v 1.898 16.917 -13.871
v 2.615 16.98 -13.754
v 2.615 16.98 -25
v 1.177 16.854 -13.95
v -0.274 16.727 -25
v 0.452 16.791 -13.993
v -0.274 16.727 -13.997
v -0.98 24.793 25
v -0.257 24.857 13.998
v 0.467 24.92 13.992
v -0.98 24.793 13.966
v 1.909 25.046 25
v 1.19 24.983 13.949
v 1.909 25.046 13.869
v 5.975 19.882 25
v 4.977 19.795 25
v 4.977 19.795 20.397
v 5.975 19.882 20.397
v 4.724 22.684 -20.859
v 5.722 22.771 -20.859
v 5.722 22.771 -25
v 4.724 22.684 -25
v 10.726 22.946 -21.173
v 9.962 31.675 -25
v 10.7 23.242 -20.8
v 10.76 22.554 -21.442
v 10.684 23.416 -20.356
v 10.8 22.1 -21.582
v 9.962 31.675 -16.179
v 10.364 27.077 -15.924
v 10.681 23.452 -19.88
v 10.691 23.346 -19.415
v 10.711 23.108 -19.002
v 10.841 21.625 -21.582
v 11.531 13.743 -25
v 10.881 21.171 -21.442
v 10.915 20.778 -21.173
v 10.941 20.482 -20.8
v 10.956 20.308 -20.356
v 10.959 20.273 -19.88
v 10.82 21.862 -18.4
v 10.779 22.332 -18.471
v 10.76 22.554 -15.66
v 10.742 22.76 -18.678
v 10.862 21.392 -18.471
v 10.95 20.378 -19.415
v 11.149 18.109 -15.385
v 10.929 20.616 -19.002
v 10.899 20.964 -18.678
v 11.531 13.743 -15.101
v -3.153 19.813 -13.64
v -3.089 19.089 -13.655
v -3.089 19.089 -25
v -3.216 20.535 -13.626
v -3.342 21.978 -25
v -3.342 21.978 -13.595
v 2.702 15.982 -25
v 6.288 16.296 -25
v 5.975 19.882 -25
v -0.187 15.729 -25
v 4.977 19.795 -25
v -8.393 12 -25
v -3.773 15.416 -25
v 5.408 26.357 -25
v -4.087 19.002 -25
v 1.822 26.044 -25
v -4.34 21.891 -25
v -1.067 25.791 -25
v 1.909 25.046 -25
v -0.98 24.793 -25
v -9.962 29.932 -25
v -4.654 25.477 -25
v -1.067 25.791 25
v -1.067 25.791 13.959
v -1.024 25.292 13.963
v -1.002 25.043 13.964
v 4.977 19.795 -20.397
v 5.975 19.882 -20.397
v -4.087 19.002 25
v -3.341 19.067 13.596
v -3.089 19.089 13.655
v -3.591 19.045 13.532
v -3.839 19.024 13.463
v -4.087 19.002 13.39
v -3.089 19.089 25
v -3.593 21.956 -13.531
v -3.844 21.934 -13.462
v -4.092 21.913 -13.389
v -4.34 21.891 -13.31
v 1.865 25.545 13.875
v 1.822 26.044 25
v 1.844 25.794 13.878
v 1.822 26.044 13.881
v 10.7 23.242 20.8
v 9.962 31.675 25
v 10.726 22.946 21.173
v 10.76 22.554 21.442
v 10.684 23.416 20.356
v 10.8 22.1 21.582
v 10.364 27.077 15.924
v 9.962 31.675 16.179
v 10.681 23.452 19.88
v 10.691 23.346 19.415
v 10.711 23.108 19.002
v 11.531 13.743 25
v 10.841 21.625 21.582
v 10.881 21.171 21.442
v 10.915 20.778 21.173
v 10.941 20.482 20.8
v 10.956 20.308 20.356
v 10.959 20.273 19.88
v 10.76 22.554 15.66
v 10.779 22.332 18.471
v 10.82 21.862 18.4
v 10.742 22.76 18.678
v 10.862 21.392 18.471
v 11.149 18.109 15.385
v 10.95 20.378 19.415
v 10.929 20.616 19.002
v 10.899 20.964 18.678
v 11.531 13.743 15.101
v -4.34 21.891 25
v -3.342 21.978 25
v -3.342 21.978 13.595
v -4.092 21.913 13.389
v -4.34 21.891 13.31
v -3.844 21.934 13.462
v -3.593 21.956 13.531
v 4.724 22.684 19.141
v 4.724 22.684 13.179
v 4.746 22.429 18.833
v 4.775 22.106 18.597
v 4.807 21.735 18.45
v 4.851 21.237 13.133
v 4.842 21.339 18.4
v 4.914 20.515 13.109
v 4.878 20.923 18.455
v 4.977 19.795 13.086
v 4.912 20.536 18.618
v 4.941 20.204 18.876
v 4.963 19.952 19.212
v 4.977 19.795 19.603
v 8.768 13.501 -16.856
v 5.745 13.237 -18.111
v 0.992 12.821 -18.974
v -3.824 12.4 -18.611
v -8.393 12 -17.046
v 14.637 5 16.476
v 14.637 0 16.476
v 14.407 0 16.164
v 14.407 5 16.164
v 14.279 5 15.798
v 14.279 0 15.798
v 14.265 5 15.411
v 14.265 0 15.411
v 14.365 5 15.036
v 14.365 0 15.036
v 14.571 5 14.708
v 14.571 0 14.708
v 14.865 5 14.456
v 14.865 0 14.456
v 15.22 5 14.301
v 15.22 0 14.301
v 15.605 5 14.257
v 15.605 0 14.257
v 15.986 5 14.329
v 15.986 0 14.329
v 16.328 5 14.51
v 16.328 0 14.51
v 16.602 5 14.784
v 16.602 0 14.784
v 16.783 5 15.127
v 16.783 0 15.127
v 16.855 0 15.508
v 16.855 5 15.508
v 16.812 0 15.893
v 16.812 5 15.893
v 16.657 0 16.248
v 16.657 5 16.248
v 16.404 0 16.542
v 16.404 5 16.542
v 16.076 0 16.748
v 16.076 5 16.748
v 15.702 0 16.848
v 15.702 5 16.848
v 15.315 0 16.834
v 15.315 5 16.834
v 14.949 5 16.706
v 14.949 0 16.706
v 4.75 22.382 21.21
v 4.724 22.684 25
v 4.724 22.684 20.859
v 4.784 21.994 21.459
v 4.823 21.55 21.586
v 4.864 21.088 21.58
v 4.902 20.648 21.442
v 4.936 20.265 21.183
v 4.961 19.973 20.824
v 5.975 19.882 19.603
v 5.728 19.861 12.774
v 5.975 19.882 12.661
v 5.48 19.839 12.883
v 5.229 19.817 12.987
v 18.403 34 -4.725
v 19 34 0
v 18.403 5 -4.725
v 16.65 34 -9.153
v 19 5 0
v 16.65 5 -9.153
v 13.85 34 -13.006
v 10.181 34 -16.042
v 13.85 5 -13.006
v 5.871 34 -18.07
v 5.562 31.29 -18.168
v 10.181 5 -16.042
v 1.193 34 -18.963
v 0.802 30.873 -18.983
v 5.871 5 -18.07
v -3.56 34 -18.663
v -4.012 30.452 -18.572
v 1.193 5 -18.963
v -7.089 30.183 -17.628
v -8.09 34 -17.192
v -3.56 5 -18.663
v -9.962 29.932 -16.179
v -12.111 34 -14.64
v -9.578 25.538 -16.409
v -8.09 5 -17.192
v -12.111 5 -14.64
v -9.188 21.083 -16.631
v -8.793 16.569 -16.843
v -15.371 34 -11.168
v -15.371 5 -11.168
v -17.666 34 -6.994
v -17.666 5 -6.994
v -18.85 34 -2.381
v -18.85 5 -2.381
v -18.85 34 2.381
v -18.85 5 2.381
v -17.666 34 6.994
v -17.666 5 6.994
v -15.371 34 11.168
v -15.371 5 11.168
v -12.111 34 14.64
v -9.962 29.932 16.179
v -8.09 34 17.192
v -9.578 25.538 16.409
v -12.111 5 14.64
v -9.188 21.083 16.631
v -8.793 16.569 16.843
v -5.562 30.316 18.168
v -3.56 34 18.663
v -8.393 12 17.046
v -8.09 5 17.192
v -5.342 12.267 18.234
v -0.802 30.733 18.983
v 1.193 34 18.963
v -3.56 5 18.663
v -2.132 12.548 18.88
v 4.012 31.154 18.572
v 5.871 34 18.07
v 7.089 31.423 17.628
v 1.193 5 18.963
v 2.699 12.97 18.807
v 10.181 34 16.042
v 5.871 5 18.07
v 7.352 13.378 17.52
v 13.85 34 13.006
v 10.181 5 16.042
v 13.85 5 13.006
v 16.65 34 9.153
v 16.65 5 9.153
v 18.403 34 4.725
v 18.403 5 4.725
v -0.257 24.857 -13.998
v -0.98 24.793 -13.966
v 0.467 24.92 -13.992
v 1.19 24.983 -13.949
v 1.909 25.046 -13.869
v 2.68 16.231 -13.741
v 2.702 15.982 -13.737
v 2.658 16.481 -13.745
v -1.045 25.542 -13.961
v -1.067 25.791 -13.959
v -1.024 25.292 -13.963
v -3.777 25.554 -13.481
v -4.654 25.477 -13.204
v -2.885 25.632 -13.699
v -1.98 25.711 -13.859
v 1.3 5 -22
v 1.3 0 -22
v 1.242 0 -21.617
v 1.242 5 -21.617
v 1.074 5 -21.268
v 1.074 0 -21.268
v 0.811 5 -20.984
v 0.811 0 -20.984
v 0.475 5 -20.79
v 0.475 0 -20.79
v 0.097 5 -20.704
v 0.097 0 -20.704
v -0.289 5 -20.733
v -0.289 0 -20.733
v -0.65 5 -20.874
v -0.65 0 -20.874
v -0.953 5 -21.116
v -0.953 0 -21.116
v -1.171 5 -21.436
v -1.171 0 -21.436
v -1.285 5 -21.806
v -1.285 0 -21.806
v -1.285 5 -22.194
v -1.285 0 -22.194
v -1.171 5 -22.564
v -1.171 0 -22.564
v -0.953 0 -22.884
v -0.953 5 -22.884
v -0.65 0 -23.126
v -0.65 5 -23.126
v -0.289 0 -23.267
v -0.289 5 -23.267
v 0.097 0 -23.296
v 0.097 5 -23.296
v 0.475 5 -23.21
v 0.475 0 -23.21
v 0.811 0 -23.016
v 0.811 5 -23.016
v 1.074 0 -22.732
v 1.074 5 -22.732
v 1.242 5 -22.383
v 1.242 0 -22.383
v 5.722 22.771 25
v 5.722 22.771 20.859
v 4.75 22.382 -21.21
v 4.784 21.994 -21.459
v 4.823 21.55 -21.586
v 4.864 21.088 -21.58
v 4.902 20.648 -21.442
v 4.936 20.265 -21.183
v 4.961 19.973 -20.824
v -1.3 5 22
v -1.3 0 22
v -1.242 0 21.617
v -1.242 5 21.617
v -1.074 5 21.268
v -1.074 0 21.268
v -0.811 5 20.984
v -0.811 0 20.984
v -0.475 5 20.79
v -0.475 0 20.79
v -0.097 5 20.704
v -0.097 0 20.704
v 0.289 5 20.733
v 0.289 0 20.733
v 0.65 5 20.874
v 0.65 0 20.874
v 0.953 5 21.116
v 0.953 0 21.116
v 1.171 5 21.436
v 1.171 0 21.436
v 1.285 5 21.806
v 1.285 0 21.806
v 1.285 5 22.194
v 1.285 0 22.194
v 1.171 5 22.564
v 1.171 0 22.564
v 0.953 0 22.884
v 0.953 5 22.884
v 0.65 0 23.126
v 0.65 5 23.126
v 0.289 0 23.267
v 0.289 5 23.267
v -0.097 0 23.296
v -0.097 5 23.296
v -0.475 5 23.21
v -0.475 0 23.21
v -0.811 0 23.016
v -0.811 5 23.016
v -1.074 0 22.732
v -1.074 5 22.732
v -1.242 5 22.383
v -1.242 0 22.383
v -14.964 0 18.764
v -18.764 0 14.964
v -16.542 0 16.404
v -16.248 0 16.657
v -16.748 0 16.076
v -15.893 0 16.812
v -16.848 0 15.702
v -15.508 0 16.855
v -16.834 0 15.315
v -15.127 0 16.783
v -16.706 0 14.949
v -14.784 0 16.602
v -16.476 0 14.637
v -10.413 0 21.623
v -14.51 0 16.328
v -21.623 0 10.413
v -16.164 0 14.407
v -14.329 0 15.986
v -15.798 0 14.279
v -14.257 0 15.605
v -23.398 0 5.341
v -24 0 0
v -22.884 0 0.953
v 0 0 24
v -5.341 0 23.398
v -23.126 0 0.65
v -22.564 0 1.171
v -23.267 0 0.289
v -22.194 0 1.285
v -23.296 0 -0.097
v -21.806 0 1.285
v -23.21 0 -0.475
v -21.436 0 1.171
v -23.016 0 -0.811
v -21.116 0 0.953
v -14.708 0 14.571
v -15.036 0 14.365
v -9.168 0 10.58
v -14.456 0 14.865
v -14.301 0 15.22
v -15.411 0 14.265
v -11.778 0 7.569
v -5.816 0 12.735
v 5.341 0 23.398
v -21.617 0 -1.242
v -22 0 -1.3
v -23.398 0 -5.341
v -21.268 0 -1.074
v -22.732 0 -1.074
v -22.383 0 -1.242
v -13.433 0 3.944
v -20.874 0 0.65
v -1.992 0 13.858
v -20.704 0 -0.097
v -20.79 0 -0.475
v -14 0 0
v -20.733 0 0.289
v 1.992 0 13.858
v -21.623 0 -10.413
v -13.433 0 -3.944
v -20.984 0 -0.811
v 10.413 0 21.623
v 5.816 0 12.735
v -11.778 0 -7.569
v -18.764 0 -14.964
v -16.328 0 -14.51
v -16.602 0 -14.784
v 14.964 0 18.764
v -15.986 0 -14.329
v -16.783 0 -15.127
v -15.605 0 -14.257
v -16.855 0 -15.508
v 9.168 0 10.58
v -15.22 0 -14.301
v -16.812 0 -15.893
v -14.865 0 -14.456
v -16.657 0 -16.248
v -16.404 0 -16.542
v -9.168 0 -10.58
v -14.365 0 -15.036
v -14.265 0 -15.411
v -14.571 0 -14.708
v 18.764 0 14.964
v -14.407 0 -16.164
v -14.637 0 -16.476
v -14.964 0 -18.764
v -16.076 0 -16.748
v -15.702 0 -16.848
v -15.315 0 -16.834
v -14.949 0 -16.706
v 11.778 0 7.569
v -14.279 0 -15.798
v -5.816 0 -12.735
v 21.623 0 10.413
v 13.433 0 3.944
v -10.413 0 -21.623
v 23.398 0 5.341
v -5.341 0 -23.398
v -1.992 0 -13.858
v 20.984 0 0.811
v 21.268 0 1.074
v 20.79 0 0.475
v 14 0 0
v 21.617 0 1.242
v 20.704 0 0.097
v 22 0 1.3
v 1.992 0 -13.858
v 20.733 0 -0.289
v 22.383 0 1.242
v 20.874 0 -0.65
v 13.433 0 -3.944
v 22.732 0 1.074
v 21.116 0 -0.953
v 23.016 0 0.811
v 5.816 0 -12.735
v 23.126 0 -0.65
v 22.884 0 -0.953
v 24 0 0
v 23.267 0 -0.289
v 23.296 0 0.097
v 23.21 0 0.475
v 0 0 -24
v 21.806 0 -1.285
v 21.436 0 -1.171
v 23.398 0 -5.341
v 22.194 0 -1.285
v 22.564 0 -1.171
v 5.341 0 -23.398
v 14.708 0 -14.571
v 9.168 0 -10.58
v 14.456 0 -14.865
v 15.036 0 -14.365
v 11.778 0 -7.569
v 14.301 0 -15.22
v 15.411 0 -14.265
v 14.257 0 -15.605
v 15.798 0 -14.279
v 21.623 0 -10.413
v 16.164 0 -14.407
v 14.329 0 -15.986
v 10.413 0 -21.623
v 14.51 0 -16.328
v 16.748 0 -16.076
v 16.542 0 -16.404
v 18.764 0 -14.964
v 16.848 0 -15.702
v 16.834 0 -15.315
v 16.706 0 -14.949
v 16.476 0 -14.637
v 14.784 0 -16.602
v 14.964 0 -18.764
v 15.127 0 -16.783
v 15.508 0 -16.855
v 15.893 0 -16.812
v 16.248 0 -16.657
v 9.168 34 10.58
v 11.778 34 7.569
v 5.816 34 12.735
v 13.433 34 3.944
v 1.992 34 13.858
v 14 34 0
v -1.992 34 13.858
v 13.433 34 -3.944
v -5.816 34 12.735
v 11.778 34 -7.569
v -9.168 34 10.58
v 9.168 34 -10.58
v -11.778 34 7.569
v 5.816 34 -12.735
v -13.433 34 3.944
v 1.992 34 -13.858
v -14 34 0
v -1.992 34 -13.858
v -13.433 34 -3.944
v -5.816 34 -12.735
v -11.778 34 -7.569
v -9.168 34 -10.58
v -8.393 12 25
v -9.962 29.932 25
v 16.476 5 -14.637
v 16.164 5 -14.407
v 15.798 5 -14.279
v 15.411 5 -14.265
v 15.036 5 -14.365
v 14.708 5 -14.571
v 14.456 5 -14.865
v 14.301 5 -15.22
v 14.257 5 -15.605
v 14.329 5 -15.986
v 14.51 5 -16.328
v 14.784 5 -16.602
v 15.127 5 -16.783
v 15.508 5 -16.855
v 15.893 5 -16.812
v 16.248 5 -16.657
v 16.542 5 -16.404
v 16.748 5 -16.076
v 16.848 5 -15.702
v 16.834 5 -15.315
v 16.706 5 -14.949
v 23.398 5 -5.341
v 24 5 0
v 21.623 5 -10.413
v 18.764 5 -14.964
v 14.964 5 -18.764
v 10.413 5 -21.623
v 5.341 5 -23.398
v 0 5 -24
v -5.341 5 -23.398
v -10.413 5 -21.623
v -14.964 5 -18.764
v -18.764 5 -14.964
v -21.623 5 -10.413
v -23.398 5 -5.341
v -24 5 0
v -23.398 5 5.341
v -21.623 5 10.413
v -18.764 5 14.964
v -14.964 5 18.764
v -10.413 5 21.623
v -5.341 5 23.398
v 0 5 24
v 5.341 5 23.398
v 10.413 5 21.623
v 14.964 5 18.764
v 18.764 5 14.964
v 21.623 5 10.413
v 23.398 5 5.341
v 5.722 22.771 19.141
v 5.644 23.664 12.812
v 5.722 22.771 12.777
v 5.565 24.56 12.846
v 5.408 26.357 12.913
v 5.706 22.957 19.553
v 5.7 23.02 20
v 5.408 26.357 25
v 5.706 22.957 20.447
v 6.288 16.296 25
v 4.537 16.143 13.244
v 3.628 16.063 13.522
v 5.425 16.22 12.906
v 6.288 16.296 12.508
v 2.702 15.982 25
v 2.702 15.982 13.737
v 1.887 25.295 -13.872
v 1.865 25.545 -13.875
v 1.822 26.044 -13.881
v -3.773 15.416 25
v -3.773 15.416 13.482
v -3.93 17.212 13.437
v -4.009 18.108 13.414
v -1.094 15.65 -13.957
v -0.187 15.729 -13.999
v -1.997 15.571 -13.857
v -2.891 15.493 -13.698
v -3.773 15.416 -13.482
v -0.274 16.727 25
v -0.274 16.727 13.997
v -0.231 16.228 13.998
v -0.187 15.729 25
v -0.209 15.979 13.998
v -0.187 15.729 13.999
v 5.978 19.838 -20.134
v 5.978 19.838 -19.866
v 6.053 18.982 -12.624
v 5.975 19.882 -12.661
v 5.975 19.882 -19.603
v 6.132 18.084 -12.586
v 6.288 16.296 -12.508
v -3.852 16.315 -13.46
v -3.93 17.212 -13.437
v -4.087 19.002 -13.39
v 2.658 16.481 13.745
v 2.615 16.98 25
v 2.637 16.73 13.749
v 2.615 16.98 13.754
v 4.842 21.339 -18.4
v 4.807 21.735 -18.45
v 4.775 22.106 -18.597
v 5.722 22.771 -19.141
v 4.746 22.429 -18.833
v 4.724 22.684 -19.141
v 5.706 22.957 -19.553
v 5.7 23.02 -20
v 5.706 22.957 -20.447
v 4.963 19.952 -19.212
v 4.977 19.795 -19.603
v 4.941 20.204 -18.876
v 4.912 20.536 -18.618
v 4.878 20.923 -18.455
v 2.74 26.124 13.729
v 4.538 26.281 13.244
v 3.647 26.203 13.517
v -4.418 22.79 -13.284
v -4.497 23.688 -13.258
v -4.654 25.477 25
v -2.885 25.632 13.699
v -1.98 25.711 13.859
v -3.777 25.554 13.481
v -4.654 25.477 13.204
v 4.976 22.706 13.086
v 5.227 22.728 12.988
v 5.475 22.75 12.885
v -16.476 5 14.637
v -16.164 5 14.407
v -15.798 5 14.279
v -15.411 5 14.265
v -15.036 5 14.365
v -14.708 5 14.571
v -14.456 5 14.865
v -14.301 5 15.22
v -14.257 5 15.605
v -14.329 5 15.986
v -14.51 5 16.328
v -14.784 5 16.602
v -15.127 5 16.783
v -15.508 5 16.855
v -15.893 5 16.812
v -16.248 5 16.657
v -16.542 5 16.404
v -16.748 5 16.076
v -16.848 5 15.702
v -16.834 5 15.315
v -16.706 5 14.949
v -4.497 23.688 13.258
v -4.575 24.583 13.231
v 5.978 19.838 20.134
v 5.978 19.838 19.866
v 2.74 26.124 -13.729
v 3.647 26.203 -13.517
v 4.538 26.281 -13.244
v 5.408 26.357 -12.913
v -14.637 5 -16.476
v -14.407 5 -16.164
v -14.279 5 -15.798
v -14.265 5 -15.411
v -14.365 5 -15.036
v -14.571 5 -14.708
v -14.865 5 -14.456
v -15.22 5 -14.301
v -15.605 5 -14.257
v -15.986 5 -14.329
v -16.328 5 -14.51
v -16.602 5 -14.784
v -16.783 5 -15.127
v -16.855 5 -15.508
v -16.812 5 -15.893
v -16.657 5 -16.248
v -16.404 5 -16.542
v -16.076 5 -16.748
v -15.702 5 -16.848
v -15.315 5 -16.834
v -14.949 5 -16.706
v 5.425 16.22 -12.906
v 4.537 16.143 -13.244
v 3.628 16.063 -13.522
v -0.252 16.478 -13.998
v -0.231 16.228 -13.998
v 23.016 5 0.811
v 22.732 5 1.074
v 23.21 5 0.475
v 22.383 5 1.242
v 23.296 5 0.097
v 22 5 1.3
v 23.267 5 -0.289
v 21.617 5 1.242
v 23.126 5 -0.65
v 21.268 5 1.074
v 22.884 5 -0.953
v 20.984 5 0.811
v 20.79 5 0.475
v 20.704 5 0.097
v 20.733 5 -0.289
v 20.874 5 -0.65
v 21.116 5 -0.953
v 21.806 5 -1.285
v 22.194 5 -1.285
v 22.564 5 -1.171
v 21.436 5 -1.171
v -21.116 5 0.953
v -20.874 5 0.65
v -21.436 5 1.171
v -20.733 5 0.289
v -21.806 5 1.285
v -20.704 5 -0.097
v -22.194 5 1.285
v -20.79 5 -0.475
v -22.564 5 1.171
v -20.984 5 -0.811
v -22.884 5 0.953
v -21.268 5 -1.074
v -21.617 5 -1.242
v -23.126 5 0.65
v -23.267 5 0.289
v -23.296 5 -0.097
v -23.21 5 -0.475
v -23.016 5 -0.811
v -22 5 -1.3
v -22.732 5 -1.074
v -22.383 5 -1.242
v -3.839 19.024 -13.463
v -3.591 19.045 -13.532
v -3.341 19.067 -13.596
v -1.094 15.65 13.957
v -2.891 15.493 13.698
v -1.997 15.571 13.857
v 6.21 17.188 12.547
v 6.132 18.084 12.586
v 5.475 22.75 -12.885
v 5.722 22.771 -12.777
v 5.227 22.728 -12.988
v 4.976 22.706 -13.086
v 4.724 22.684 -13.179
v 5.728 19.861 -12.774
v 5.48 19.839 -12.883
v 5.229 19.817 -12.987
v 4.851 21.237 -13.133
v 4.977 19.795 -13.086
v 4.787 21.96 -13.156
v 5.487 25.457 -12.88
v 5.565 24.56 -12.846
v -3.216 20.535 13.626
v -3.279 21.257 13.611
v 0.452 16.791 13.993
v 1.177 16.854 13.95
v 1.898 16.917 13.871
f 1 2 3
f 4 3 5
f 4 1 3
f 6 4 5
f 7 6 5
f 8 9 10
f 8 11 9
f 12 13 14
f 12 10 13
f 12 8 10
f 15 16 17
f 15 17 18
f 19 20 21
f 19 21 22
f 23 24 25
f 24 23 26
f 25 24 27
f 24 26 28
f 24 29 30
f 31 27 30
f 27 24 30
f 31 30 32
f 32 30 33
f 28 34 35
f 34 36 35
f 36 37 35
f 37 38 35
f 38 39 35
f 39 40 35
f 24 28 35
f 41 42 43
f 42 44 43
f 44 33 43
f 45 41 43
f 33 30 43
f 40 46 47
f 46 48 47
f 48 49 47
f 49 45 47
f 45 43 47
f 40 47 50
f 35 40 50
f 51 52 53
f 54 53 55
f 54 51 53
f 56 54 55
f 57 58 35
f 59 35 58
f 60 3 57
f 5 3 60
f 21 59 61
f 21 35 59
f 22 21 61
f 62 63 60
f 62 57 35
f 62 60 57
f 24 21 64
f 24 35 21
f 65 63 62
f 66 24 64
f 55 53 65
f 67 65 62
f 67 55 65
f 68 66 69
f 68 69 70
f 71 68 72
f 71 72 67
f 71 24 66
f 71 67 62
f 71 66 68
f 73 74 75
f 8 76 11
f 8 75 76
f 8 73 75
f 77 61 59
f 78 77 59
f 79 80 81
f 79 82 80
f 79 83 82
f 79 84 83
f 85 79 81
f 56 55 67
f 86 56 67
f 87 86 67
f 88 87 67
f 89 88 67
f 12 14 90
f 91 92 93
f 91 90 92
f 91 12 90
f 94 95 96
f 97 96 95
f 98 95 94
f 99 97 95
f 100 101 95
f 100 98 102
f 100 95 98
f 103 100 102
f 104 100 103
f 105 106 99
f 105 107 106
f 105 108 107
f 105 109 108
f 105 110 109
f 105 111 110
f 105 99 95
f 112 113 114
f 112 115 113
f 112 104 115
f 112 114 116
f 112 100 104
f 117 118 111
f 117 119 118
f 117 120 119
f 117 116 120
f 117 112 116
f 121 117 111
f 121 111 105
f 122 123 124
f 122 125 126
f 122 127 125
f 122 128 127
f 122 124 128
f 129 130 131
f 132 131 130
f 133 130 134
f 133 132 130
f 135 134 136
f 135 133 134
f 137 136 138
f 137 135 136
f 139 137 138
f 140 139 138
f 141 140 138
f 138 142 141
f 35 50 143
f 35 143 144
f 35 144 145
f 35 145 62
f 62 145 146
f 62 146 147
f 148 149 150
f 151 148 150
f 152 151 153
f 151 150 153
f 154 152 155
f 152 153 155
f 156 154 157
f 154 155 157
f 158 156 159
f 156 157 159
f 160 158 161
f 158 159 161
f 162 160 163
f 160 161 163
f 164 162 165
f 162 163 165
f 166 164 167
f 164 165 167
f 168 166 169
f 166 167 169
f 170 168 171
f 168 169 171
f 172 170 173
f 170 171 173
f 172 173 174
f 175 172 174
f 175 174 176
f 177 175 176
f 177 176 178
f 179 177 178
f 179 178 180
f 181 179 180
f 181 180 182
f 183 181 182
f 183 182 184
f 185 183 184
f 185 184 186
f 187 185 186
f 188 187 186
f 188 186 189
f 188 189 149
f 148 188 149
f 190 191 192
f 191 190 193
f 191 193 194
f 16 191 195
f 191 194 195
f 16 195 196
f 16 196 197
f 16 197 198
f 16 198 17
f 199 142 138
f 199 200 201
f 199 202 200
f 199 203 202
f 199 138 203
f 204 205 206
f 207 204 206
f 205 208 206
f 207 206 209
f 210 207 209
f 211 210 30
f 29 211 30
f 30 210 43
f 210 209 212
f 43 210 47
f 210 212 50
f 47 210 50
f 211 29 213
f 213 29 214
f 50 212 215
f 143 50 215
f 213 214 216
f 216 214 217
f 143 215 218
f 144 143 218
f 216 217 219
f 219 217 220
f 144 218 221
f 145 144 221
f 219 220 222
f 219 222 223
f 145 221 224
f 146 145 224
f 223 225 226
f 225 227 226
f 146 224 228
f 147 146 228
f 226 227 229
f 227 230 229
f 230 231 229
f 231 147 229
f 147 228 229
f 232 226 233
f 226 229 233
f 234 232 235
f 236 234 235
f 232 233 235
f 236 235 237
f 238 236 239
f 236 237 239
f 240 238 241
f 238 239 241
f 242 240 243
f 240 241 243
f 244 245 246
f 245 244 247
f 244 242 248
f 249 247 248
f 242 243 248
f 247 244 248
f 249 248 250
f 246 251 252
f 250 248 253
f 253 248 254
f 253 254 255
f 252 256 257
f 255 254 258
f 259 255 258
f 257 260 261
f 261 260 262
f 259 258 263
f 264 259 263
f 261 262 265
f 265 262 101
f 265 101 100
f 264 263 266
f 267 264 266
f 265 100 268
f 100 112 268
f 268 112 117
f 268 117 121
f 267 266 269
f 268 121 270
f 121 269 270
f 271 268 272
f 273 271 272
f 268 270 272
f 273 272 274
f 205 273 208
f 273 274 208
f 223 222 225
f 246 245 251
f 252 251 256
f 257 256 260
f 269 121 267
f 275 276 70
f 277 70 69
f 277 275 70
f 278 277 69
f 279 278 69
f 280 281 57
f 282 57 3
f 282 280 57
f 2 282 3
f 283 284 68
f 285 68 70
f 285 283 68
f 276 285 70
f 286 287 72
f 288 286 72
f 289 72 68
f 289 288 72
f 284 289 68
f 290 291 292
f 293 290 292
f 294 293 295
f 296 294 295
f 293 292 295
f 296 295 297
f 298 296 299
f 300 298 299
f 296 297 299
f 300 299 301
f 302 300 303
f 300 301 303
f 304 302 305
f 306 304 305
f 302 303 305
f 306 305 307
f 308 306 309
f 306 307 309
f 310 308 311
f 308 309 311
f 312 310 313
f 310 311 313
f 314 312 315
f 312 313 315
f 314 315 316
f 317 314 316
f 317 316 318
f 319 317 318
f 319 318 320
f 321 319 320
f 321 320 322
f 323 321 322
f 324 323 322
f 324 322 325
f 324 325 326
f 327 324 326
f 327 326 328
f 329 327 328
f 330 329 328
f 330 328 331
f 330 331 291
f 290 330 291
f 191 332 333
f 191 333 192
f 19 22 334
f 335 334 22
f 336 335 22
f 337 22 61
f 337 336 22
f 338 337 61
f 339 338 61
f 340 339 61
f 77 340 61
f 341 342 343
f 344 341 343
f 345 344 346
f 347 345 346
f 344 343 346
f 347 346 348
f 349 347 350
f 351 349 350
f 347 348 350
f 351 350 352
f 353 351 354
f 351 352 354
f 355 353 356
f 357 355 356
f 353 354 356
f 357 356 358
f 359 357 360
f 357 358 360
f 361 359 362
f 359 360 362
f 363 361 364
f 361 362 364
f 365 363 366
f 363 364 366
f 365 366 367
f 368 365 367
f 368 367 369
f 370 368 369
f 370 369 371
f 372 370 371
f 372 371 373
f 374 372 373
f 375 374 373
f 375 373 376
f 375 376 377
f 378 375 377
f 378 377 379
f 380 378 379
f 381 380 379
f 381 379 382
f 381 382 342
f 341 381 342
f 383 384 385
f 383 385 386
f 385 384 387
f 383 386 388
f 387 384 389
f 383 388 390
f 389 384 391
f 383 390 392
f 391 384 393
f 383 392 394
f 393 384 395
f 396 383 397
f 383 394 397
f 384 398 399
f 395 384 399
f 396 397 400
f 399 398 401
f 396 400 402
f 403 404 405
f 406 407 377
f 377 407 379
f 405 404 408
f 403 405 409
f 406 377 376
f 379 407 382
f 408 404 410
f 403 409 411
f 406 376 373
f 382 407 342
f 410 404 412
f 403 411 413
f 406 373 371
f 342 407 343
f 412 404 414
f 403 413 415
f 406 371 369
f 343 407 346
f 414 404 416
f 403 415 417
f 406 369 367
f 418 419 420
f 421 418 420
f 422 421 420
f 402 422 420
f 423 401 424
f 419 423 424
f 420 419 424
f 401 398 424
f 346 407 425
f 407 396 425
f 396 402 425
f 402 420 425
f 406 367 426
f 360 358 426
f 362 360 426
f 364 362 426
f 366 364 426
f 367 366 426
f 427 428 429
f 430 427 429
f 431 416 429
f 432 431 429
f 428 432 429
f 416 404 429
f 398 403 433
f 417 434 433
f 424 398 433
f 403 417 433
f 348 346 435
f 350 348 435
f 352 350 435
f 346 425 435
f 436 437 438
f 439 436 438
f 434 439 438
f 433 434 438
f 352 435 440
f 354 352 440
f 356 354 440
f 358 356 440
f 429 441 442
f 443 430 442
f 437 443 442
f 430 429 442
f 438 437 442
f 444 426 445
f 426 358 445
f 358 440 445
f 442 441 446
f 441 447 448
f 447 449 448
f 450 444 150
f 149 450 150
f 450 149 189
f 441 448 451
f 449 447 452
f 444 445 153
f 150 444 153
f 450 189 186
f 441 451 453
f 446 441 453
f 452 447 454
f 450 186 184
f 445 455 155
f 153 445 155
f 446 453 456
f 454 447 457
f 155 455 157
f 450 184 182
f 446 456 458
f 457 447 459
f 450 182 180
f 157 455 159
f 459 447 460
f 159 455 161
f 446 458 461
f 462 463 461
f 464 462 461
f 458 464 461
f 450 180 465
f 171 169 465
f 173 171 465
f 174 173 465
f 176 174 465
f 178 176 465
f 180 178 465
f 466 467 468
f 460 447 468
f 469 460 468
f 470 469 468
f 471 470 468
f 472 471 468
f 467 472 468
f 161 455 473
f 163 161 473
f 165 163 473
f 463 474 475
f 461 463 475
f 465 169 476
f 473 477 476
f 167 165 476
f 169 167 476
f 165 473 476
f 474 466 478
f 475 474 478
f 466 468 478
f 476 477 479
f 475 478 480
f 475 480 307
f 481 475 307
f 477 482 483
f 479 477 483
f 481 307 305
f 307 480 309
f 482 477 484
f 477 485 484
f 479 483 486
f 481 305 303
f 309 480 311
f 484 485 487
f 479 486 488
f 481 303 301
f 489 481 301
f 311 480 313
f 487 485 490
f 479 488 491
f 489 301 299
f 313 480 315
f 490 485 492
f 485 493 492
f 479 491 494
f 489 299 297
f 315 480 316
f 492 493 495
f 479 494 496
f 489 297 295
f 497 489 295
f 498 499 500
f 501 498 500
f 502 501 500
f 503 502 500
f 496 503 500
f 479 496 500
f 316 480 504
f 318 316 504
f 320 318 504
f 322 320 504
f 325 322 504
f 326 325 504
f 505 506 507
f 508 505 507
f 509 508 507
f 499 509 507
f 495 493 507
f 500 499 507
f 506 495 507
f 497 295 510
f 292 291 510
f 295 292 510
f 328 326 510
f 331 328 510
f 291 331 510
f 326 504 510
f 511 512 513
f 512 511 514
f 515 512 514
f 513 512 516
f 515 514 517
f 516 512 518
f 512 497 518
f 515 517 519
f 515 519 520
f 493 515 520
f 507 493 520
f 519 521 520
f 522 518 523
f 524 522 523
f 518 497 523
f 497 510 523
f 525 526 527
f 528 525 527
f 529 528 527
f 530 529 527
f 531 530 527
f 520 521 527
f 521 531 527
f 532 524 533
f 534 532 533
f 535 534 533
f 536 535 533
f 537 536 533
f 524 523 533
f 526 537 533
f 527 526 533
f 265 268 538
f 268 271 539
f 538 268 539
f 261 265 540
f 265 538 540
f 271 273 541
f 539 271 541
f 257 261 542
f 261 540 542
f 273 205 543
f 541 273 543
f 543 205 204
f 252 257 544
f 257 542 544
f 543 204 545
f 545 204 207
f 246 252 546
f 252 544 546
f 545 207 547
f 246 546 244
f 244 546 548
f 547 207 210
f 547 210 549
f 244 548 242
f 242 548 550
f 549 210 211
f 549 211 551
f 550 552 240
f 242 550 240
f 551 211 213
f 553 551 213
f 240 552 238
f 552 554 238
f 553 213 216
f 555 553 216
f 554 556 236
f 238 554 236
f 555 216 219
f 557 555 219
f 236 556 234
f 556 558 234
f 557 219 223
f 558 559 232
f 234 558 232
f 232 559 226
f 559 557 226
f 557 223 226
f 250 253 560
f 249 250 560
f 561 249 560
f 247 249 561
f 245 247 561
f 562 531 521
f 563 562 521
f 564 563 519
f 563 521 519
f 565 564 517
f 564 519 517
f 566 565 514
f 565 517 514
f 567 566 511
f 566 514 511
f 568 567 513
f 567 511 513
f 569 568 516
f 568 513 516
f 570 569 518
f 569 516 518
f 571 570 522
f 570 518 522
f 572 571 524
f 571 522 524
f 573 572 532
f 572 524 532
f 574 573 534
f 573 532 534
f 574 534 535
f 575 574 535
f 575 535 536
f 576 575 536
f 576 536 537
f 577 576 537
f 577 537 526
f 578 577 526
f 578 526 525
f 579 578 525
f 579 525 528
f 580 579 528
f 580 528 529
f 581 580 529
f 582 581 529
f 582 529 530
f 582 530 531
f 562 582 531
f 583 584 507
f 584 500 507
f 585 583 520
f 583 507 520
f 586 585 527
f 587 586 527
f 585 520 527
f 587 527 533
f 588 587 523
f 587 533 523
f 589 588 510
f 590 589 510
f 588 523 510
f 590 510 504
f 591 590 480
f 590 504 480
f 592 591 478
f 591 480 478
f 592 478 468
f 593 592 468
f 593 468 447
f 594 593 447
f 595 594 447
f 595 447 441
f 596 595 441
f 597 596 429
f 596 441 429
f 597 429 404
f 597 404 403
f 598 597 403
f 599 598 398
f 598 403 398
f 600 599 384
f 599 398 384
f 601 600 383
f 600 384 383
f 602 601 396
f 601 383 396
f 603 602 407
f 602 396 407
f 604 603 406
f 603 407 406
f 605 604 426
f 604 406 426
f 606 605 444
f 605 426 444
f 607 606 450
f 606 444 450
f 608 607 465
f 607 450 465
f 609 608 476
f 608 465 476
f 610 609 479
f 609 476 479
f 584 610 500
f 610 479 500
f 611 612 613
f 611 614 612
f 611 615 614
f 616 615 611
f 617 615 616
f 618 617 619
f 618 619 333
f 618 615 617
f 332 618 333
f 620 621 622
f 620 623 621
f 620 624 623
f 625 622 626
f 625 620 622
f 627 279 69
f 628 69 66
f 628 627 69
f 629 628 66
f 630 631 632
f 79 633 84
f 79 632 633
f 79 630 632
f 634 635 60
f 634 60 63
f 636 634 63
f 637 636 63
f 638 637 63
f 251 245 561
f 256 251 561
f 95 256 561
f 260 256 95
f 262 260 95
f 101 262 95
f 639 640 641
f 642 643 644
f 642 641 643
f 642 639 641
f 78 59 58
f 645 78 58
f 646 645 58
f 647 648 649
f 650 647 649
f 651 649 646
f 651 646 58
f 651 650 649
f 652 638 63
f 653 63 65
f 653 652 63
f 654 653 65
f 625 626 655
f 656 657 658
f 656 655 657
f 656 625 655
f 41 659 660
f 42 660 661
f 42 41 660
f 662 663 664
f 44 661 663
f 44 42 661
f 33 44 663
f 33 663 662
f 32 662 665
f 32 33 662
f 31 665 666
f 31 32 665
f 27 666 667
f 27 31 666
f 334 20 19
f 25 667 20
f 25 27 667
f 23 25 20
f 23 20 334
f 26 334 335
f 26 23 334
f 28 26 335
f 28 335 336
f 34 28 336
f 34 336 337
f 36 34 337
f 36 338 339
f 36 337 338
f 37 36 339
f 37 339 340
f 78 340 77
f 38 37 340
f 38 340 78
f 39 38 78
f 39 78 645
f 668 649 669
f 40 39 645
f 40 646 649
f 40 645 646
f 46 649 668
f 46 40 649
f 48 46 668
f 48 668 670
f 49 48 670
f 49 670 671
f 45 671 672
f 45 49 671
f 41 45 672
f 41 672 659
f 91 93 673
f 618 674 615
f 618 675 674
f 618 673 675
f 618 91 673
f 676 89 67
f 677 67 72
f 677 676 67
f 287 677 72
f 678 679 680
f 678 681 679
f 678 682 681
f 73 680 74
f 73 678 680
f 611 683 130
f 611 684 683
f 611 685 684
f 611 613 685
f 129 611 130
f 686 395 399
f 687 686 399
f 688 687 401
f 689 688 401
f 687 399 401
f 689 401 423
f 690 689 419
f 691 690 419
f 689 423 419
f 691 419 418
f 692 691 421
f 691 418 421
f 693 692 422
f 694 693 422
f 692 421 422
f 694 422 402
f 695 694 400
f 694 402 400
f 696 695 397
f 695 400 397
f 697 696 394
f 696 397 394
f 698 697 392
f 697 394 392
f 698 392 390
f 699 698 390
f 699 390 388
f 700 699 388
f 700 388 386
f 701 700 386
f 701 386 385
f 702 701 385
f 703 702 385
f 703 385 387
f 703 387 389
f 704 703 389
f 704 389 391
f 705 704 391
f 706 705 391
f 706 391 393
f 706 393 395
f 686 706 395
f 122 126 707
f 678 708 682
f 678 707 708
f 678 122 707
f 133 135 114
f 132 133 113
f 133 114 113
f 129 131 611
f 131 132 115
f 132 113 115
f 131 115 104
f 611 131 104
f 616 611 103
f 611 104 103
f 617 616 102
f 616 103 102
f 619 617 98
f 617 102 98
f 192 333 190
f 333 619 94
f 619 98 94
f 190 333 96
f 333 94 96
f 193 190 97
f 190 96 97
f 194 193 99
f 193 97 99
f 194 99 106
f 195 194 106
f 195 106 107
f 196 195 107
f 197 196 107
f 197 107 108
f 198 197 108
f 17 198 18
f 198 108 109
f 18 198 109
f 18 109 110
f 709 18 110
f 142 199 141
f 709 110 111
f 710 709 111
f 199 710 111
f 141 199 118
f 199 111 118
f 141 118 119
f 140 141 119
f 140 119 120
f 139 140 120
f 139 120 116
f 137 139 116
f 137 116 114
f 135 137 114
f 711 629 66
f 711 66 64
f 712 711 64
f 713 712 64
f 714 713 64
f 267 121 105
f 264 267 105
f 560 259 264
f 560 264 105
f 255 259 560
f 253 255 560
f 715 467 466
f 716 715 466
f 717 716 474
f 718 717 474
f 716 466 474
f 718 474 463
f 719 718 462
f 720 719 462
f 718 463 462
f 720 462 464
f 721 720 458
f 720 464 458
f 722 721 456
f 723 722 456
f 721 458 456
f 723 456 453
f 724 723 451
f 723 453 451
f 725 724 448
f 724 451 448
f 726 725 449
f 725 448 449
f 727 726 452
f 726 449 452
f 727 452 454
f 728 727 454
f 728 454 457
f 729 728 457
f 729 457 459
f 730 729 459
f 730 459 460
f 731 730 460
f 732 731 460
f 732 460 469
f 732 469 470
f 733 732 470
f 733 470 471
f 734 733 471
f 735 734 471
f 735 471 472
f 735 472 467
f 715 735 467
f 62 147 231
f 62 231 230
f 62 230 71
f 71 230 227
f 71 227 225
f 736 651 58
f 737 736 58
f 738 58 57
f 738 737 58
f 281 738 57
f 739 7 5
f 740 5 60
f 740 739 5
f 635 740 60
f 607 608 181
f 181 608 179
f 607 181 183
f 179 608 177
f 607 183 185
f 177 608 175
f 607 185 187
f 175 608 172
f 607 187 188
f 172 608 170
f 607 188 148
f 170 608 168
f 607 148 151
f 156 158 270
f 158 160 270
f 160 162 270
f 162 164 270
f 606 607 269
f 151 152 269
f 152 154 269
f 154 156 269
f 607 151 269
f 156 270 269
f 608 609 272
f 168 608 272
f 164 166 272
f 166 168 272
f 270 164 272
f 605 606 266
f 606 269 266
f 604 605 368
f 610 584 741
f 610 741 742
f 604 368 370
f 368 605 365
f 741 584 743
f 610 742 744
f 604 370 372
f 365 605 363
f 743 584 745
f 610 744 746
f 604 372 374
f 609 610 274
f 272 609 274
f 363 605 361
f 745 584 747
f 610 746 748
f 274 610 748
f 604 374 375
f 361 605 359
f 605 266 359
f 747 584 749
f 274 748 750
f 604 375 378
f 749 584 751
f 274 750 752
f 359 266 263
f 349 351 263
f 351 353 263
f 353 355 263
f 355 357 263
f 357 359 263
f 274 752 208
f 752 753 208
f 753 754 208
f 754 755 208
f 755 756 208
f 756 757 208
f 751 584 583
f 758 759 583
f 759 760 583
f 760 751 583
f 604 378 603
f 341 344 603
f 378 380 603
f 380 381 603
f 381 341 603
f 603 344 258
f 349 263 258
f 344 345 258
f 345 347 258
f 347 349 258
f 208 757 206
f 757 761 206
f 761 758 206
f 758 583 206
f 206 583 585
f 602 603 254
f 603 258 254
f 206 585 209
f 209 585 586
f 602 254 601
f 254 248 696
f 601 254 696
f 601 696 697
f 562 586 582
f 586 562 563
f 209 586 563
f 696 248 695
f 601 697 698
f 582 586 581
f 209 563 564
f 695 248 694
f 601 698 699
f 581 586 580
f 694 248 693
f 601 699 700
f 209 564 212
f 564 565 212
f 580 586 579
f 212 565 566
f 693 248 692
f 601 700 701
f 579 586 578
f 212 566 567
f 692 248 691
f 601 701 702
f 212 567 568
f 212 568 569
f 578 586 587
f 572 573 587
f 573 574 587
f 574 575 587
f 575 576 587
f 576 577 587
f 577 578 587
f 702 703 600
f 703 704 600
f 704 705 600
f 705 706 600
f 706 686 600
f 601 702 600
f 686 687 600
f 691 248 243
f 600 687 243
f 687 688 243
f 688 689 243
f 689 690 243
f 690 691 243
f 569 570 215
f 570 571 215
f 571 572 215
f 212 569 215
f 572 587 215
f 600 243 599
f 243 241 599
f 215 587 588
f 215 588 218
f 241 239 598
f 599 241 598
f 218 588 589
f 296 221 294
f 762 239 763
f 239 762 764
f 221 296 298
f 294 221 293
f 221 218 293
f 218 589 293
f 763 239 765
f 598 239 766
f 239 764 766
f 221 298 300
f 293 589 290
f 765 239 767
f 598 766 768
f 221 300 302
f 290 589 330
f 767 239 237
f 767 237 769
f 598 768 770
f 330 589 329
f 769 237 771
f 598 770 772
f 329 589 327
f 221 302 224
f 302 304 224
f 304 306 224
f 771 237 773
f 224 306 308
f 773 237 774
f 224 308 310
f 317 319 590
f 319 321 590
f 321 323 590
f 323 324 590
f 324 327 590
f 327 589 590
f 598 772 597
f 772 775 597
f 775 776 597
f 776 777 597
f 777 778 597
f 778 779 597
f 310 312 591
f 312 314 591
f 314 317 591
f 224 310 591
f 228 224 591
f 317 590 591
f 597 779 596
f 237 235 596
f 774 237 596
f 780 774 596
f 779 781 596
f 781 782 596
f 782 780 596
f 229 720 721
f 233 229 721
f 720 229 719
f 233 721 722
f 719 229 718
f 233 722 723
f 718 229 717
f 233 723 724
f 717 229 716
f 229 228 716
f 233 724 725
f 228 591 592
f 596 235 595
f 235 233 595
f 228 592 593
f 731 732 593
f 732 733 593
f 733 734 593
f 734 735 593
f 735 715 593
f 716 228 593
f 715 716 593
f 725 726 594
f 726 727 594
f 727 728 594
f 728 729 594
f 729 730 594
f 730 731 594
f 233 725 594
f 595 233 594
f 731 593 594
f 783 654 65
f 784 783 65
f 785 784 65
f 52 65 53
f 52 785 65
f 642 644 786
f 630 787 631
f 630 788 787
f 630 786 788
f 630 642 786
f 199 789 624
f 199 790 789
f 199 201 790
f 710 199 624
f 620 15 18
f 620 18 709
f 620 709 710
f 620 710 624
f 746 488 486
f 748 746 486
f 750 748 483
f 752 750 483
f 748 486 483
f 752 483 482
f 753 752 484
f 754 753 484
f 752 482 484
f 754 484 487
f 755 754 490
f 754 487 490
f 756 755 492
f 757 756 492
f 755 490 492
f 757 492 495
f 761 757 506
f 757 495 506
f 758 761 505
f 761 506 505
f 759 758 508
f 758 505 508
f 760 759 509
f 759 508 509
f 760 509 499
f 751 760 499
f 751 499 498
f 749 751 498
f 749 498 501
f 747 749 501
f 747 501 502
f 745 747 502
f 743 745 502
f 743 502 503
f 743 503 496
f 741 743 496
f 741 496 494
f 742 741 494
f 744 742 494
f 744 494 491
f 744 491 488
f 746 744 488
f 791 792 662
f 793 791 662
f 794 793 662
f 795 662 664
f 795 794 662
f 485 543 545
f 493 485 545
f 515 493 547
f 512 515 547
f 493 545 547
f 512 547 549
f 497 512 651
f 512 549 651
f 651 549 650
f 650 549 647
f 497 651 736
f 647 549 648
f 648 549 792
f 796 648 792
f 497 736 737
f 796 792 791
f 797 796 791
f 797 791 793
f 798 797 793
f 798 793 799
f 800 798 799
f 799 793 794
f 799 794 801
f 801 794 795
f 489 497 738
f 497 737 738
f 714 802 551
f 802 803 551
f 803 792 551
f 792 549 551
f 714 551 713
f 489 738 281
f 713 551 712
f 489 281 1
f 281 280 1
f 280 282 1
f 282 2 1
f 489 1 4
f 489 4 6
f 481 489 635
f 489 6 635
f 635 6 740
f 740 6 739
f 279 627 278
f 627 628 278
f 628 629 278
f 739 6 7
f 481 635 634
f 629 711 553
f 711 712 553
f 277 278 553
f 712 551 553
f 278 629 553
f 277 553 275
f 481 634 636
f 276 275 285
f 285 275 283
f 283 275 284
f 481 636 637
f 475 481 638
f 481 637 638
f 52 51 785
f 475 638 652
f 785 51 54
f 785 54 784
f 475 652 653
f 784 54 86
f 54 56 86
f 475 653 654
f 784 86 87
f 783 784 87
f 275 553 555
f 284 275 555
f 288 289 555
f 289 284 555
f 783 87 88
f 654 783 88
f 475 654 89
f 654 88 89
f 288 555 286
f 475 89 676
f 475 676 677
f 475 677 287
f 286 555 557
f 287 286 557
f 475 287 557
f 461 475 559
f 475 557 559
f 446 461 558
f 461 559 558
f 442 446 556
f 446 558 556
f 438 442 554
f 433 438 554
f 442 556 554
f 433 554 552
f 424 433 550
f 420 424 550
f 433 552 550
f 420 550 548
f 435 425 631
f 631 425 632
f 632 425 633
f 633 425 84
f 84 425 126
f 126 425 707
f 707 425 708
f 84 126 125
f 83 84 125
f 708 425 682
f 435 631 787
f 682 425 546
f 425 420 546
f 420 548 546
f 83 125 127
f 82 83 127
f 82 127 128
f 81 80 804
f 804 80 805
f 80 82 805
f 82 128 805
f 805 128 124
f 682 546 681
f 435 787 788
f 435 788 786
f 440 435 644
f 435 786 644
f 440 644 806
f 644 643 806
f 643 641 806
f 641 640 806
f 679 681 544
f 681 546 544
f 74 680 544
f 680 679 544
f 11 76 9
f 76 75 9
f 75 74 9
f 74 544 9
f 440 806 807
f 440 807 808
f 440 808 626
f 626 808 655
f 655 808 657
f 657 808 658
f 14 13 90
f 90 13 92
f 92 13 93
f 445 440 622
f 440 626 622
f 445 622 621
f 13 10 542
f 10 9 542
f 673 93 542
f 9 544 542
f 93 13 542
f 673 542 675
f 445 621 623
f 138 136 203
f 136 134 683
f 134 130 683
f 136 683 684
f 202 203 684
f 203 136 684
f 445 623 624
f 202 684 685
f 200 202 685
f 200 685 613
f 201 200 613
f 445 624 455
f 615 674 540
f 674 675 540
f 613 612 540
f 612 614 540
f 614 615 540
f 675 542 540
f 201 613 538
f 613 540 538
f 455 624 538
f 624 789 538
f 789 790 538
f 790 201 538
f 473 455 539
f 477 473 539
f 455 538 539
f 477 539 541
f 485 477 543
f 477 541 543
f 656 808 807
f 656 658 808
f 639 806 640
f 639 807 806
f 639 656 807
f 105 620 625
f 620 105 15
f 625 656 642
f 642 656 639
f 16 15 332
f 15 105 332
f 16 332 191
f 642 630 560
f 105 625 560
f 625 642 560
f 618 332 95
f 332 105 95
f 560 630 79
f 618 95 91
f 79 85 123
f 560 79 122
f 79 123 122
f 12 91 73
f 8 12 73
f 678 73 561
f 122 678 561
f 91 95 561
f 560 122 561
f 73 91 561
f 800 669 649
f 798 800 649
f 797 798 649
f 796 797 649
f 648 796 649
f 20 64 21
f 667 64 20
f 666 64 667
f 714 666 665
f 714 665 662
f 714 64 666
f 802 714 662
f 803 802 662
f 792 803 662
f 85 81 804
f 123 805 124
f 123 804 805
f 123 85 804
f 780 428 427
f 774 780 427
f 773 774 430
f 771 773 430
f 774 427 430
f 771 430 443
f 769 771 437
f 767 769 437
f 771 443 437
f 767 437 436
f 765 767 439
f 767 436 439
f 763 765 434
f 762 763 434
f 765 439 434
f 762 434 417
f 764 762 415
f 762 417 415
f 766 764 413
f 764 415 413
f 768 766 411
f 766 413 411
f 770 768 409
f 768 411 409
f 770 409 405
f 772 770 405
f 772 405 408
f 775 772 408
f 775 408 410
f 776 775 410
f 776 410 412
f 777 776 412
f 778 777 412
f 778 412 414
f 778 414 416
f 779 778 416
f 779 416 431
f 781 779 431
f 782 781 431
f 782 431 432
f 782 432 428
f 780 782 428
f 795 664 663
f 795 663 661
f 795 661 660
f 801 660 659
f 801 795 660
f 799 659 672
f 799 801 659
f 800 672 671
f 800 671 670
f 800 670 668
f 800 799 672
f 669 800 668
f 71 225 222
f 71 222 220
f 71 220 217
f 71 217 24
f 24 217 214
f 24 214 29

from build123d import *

# Parameters (mm, degrees)
ESQUISSE4_R                = 1.3
FIXINGHOLE_DEPTH           = 35
FIXINGHOLEREPETITION_COUNT = 8
RIGHTFIXING_DEPTH          = 10
ESQUISSE7_R                = 1.6
TOPFIXINGHOLES_DEPTH       = 8.6
HOLEFORFIXING_DEPTH        = 51


with BuildPart() as part:
    # Esquisse1 → Révolution1 (revolve)
    with BuildSketch(Plane.XY):
        Polygon((14, 0), (14, 34), (19, 34), (19, 5), (24, 5), (24, 0), align=None)
    revolve(axis=Axis((0, -1.825, 0), (0, 1, 0)))

    # Esquisse4 → FixingHole (cut, through all)
    with BuildSketch(Plane(origin=(0, 0, 0), x_dir=(-1, 0, 0), z_dir=(0, -1, 0))):
        with Locations((0, -22)):
            Circle(ESQUISSE4_R)
    fixinghole = extrude(amount=-FIXINGHOLE_DEPTH, mode=Mode.SUBTRACT)

    # FixingHoleRepetition: FixingHole ×8 about axis
    fixingholerepetition_axis = Axis((0, 0, 0), (0, 1, 0))
    for i in range(1, FIXINGHOLEREPETITION_COUNT):
        add(fixinghole.rotate(fixingholerepetition_axis, i * 360 / FIXINGHOLEREPETITION_COUNT), mode=Mode.SUBTRACT)

    # Esquisse5 → RightFixing (add)
    with BuildSketch(Plane.XY.offset(15)):
        Polygon((9.961946981, 31.674619421), (11.53075035, 13.743114855), (-8.393143611, 12), (-9.961946981, 29.931504566), align=None)
        Polygon((5.40803663, 26.357486686), (5.721797304, 22.771185773), (4.724085983, 22.683897343), (4.976837637, 19.794932719), (5.974548958, 19.882221149), (6.288309632, 16.295920235), (2.702008719, 15.982159562), (2.614720288, 16.979870883), (-0.274244336, 16.727119229), (-0.186955906, 15.729407908), (-3.773256819, 15.415647234), (-4.087017493, 19.001948147), (-3.089306172, 19.089236577), (-3.342057826, 21.978201201), (-4.339769147, 21.890912771), (-4.653529821, 25.477213684), (-1.067228908, 25.790974358), (-0.979940478, 24.793263037), (1.909024147, 25.046014691), (1.821735717, 26.043726012), align=None, mode=Mode.SUBTRACT)
    rightfixing = extrude(amount=RIGHTFIXING_DEPTH)

    # Esquisse7 → TopFixingHoles (cut)
    with BuildSketch(Plane(origin=(12.636394772, 1.10554129, 0), x_dir=(0, 0, -1), z_dir=(0.996194698, 0.087155743, 0))):
        with Locations((-20, 20.835847043)):
            Circle(ESQUISSE7_R)
    topfixingholes = extrude(amount=-TOPFIXINGHOLES_DEPTH, mode=Mode.SUBTRACT)

    # FixingSymetry: RightFixing, TopFixingHoles across plane
    add(rightfixing.mirror(Plane.XY))
    add(topfixingholes.mirror(Plane.XY), mode=Mode.SUBTRACT)

    # Esquisse6 → HoleForFixing (cut, through all)
    with BuildSketch(Plane.XY.offset(25)):
        Polygon((5.40803663, 26.357486686), (5.721797304, 22.771185773), (4.724085983, 22.683897343), (4.976837637, 19.794932719), (5.974548958, 19.882221149), (6.288309632, 16.295920235), (2.702008719, 15.982159562), (2.614720288, 16.979870883), (-0.274244336, 16.727119229), (-0.186955906, 15.729407908), (-3.773256819, 15.415647234), (-4.087017493, 19.001948147), (-3.089306172, 19.089236577), (-3.342057826, 21.978201201), (-4.339769147, 21.890912771), (-4.653529821, 25.477213684), (-1.067228908, 25.790974358), (-0.979940478, 24.793263037), (1.909024147, 25.046014691), (1.821735717, 26.043726012), align=None)
    extrude(amount=-HOLEFORFIXING_DEPTH, mode=Mode.SUBTRACT)


solid = part.part
